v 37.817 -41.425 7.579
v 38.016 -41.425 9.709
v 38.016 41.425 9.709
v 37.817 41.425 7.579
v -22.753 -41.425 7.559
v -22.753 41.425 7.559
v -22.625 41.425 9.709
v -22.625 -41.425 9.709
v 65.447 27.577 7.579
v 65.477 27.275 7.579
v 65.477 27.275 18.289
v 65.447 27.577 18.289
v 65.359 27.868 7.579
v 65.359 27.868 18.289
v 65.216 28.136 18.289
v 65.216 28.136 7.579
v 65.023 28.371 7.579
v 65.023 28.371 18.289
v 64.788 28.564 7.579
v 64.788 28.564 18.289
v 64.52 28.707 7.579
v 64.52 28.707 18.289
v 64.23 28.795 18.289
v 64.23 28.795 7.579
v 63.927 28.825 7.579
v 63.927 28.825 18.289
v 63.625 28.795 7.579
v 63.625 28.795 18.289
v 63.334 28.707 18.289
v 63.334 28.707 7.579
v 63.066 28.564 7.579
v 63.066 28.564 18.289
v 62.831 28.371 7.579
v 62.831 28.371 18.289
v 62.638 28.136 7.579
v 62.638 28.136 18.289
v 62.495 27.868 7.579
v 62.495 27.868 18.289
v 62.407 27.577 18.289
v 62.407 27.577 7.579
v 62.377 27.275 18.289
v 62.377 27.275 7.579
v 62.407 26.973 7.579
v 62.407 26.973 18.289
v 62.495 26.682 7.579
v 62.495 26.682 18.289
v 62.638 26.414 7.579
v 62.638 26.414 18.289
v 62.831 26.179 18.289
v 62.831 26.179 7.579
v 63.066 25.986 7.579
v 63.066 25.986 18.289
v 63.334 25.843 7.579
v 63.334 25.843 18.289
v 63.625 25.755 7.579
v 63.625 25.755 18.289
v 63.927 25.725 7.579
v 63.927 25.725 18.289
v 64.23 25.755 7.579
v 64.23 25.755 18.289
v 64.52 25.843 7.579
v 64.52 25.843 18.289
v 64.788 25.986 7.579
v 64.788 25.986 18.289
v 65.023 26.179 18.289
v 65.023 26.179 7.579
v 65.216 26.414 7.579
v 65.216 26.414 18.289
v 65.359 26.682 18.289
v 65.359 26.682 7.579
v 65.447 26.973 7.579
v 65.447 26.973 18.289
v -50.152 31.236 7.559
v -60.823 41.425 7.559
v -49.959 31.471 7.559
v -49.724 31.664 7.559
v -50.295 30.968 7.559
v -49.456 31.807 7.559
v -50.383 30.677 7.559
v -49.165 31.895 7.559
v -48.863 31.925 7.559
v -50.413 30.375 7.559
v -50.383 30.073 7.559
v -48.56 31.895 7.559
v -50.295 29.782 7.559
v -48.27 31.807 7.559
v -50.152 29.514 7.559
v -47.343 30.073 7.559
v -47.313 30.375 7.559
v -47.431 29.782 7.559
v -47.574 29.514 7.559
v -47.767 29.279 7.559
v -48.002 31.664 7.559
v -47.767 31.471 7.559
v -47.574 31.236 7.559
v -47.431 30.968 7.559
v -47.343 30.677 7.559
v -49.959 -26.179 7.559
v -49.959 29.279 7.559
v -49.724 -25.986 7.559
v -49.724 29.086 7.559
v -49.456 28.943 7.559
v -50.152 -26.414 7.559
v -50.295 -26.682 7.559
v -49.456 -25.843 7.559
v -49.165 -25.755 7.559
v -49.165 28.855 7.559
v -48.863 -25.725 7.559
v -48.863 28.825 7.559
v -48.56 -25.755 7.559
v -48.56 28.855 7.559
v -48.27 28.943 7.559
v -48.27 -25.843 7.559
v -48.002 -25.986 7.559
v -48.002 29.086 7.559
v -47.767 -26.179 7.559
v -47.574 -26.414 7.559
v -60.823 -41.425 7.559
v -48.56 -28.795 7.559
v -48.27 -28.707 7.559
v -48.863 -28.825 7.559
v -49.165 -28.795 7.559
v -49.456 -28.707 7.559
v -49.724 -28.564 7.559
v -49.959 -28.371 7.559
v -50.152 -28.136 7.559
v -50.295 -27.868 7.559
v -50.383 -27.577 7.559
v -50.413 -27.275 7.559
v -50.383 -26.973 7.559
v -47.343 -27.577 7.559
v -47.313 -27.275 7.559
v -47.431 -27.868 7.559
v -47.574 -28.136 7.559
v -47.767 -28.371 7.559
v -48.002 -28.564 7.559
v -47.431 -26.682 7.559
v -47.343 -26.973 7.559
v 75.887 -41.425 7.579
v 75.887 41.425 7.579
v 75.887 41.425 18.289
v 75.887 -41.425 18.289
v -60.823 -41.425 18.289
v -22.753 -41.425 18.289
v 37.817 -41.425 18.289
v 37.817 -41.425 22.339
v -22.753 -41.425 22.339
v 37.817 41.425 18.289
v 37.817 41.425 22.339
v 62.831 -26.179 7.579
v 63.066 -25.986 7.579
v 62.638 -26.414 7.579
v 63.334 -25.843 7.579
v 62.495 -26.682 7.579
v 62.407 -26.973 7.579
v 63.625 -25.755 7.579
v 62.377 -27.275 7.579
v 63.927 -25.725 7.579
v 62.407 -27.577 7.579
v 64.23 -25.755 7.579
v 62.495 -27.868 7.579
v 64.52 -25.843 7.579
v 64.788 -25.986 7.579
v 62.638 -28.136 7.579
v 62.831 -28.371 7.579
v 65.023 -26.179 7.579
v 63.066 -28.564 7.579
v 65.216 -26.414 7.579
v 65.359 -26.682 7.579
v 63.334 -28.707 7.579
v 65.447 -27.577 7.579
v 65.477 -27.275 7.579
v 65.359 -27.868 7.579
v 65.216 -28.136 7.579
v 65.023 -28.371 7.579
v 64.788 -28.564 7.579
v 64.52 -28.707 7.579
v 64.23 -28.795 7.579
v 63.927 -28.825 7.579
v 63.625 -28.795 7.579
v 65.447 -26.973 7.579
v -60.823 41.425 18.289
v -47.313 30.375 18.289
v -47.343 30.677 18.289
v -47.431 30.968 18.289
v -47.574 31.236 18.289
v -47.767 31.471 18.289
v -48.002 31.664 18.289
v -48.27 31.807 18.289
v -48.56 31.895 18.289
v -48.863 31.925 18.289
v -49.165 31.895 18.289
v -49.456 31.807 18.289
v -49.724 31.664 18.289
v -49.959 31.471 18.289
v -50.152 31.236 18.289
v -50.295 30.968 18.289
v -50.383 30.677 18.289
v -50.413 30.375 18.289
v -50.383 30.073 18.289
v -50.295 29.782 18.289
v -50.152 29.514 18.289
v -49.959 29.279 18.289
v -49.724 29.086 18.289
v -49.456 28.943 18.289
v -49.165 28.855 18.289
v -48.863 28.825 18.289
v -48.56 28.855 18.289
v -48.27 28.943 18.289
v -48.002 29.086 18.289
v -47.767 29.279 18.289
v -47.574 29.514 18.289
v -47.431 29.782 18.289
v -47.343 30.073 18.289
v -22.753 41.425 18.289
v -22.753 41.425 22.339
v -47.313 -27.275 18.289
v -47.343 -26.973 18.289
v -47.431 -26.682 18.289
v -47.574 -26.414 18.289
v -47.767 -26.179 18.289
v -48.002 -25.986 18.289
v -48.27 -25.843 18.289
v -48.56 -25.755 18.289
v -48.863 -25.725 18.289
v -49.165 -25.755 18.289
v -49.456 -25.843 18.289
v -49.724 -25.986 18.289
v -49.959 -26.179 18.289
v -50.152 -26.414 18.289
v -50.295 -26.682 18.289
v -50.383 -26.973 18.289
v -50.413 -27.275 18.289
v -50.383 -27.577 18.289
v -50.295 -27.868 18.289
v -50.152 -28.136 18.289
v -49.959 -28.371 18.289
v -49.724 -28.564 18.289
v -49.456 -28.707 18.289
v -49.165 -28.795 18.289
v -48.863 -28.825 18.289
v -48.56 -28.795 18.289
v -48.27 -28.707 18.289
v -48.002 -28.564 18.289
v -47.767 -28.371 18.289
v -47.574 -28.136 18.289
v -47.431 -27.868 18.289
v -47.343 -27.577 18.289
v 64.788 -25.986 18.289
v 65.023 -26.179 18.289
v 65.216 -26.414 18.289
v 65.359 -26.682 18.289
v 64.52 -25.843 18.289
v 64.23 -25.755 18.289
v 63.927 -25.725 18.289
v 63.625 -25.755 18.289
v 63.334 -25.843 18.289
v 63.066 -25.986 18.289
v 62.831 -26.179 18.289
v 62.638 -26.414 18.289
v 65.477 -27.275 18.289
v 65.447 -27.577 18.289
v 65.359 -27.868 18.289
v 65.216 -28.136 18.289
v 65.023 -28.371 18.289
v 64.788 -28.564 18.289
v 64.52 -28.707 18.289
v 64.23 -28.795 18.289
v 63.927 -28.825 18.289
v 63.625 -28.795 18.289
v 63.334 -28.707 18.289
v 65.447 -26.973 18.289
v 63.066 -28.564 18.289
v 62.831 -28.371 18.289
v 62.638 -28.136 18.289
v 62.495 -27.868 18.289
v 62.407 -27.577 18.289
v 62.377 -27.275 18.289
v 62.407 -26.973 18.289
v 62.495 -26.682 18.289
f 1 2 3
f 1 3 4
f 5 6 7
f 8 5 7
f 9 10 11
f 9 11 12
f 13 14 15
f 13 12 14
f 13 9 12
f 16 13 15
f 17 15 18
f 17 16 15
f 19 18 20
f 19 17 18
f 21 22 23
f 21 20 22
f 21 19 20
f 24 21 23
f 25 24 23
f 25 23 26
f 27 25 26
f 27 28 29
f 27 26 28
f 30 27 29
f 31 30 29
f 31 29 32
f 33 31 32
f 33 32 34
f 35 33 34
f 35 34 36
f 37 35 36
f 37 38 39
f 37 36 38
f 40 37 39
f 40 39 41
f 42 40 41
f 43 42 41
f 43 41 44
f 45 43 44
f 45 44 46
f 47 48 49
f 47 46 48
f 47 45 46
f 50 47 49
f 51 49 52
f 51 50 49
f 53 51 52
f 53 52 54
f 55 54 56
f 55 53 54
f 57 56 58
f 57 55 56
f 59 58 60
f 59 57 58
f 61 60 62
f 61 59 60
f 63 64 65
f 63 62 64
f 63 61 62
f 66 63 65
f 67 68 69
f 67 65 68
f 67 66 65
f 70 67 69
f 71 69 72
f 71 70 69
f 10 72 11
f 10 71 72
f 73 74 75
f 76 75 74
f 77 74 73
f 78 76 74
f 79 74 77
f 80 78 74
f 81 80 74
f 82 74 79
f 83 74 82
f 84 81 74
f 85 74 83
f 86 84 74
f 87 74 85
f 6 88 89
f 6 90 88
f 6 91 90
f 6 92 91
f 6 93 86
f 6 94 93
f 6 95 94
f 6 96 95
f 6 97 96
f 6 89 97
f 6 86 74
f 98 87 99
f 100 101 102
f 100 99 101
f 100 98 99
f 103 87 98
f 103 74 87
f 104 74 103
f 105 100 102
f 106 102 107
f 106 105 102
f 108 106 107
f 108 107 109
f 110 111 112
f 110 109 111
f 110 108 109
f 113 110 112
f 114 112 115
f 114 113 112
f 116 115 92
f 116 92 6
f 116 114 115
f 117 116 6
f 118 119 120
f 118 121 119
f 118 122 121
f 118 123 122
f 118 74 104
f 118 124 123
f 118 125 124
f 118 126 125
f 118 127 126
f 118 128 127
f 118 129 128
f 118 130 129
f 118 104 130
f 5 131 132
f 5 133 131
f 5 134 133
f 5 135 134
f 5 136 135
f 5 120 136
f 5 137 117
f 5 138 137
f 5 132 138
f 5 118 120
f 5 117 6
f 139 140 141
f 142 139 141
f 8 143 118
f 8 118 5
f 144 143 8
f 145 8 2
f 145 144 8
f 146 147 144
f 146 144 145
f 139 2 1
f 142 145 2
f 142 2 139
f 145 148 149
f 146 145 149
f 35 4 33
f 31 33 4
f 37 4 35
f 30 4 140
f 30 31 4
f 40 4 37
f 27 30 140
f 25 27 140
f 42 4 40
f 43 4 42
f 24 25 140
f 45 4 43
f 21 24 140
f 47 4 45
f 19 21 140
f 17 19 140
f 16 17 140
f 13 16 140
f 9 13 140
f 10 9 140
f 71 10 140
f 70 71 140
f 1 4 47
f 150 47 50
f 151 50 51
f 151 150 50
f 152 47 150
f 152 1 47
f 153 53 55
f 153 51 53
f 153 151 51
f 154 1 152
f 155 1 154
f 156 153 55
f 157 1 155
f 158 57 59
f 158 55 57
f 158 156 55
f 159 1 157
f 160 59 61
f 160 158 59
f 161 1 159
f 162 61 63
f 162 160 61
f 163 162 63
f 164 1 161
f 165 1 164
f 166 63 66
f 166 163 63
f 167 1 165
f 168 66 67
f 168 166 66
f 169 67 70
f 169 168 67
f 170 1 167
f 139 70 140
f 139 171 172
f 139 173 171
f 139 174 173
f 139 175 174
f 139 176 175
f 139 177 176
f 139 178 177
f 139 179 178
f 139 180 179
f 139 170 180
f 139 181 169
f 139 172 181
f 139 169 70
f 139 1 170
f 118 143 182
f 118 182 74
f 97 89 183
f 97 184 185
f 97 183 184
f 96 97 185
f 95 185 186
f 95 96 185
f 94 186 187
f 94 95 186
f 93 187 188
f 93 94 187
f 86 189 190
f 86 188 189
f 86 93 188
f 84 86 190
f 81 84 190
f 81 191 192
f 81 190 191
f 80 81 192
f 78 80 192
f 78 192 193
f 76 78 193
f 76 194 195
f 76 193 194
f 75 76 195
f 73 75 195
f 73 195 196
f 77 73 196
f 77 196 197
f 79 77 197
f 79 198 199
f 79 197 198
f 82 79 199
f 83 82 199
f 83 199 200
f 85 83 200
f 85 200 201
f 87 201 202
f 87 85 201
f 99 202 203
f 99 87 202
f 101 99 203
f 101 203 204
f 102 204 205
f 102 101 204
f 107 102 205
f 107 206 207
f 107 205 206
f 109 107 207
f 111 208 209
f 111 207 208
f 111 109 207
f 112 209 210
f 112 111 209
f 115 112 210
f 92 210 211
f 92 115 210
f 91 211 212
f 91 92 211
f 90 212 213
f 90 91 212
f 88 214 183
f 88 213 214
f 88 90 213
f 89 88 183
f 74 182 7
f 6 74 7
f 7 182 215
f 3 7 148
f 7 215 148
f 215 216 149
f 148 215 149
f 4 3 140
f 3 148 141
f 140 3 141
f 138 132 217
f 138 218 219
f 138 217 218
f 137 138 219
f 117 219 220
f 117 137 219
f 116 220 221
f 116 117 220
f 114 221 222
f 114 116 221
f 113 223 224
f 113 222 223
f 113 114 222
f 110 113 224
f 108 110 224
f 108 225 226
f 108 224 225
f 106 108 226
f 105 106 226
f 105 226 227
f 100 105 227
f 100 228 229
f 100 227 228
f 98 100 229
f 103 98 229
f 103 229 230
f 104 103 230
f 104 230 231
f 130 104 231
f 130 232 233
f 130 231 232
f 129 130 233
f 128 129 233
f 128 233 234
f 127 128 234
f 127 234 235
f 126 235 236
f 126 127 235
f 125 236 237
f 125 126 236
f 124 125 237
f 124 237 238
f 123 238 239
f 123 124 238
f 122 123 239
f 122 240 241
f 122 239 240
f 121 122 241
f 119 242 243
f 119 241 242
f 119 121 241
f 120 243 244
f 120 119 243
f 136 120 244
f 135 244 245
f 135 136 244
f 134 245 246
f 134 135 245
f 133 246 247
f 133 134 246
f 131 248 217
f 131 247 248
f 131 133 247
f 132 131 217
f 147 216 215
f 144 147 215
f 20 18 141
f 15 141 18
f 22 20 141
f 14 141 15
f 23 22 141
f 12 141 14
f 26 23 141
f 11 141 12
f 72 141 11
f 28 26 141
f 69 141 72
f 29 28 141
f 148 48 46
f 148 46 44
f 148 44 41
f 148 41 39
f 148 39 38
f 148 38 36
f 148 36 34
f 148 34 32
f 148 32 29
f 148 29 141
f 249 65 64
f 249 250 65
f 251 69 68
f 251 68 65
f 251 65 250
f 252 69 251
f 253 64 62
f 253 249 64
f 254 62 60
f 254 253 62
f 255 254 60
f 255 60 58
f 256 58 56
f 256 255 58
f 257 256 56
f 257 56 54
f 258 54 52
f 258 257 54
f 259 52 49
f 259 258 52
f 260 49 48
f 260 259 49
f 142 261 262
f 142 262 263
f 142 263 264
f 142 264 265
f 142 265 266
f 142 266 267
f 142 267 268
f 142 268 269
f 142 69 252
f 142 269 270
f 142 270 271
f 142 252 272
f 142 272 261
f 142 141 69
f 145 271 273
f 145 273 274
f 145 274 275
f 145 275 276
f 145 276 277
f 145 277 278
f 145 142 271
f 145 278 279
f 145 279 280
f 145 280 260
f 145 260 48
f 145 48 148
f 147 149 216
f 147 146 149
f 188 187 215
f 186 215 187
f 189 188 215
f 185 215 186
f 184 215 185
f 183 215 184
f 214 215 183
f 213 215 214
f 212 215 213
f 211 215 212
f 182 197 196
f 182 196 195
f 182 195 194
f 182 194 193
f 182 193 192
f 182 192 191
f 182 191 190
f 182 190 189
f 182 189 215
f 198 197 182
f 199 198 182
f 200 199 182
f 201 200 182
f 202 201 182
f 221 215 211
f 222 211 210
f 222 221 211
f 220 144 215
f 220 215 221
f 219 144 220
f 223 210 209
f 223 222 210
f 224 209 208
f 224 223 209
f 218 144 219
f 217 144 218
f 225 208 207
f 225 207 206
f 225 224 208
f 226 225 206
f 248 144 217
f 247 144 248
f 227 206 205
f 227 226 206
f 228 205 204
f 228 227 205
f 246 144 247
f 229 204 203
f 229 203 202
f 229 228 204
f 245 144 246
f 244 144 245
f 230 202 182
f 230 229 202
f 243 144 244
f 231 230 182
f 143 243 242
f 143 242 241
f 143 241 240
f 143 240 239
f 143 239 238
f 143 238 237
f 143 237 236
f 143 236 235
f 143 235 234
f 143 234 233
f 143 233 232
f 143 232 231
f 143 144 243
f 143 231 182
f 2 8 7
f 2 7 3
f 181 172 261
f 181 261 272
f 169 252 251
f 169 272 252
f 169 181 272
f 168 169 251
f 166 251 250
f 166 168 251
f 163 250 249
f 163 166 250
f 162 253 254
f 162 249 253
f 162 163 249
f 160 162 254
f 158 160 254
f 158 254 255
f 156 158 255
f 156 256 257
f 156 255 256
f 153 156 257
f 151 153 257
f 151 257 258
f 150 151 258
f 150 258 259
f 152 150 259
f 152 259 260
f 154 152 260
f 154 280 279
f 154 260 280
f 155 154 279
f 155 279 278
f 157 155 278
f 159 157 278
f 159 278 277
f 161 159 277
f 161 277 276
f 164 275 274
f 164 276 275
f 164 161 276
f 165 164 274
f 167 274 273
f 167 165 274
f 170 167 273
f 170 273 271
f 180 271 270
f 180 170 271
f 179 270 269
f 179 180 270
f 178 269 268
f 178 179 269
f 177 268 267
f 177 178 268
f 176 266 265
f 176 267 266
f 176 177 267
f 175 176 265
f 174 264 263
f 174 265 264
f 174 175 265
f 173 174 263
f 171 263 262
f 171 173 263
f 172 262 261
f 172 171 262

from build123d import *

# Parameters (mm, degrees)
F1_DEPTH = 41.425
F2_R     = 1.55
F3_DEPTH = 22.339877


with BuildPart() as f1:
    # F0 (on Front) → F1 (new body, symmetric)
    with BuildSketch(Plane.XZ):
        Polygon((-22.752756, 18.288877), (-60.822756, 18.288877), (-60.822756, 7.558877), (-22.752756, 7.558877), (-22.625374, 9.708877), (38.016342, 9.708877), (37.817244, 7.578877), (75.887244, 7.578877), (75.887244, 18.288877), (37.817244, 18.288877), (37.817244, 22.338877), (-22.752756, 22.338877), align=None)
    extrude(amount=F1_DEPTH, both=True)

    # F2 (on Top) → F3 (cut, through all)
    with BuildSketch(Plane.XY):
        with Locations((-48.862756, 30.375)):
            Circle(F2_R)
        with Locations((63.927244, 27.275)):
            Circle(F2_R)
        with Locations((63.927244, -27.275)):
            Circle(F2_R)
        with Locations((-48.862756, -27.275)):
            Circle(F2_R)
    extrude(amount=F3_DEPTH, mode=Mode.SUBTRACT)


solid = f1.part
